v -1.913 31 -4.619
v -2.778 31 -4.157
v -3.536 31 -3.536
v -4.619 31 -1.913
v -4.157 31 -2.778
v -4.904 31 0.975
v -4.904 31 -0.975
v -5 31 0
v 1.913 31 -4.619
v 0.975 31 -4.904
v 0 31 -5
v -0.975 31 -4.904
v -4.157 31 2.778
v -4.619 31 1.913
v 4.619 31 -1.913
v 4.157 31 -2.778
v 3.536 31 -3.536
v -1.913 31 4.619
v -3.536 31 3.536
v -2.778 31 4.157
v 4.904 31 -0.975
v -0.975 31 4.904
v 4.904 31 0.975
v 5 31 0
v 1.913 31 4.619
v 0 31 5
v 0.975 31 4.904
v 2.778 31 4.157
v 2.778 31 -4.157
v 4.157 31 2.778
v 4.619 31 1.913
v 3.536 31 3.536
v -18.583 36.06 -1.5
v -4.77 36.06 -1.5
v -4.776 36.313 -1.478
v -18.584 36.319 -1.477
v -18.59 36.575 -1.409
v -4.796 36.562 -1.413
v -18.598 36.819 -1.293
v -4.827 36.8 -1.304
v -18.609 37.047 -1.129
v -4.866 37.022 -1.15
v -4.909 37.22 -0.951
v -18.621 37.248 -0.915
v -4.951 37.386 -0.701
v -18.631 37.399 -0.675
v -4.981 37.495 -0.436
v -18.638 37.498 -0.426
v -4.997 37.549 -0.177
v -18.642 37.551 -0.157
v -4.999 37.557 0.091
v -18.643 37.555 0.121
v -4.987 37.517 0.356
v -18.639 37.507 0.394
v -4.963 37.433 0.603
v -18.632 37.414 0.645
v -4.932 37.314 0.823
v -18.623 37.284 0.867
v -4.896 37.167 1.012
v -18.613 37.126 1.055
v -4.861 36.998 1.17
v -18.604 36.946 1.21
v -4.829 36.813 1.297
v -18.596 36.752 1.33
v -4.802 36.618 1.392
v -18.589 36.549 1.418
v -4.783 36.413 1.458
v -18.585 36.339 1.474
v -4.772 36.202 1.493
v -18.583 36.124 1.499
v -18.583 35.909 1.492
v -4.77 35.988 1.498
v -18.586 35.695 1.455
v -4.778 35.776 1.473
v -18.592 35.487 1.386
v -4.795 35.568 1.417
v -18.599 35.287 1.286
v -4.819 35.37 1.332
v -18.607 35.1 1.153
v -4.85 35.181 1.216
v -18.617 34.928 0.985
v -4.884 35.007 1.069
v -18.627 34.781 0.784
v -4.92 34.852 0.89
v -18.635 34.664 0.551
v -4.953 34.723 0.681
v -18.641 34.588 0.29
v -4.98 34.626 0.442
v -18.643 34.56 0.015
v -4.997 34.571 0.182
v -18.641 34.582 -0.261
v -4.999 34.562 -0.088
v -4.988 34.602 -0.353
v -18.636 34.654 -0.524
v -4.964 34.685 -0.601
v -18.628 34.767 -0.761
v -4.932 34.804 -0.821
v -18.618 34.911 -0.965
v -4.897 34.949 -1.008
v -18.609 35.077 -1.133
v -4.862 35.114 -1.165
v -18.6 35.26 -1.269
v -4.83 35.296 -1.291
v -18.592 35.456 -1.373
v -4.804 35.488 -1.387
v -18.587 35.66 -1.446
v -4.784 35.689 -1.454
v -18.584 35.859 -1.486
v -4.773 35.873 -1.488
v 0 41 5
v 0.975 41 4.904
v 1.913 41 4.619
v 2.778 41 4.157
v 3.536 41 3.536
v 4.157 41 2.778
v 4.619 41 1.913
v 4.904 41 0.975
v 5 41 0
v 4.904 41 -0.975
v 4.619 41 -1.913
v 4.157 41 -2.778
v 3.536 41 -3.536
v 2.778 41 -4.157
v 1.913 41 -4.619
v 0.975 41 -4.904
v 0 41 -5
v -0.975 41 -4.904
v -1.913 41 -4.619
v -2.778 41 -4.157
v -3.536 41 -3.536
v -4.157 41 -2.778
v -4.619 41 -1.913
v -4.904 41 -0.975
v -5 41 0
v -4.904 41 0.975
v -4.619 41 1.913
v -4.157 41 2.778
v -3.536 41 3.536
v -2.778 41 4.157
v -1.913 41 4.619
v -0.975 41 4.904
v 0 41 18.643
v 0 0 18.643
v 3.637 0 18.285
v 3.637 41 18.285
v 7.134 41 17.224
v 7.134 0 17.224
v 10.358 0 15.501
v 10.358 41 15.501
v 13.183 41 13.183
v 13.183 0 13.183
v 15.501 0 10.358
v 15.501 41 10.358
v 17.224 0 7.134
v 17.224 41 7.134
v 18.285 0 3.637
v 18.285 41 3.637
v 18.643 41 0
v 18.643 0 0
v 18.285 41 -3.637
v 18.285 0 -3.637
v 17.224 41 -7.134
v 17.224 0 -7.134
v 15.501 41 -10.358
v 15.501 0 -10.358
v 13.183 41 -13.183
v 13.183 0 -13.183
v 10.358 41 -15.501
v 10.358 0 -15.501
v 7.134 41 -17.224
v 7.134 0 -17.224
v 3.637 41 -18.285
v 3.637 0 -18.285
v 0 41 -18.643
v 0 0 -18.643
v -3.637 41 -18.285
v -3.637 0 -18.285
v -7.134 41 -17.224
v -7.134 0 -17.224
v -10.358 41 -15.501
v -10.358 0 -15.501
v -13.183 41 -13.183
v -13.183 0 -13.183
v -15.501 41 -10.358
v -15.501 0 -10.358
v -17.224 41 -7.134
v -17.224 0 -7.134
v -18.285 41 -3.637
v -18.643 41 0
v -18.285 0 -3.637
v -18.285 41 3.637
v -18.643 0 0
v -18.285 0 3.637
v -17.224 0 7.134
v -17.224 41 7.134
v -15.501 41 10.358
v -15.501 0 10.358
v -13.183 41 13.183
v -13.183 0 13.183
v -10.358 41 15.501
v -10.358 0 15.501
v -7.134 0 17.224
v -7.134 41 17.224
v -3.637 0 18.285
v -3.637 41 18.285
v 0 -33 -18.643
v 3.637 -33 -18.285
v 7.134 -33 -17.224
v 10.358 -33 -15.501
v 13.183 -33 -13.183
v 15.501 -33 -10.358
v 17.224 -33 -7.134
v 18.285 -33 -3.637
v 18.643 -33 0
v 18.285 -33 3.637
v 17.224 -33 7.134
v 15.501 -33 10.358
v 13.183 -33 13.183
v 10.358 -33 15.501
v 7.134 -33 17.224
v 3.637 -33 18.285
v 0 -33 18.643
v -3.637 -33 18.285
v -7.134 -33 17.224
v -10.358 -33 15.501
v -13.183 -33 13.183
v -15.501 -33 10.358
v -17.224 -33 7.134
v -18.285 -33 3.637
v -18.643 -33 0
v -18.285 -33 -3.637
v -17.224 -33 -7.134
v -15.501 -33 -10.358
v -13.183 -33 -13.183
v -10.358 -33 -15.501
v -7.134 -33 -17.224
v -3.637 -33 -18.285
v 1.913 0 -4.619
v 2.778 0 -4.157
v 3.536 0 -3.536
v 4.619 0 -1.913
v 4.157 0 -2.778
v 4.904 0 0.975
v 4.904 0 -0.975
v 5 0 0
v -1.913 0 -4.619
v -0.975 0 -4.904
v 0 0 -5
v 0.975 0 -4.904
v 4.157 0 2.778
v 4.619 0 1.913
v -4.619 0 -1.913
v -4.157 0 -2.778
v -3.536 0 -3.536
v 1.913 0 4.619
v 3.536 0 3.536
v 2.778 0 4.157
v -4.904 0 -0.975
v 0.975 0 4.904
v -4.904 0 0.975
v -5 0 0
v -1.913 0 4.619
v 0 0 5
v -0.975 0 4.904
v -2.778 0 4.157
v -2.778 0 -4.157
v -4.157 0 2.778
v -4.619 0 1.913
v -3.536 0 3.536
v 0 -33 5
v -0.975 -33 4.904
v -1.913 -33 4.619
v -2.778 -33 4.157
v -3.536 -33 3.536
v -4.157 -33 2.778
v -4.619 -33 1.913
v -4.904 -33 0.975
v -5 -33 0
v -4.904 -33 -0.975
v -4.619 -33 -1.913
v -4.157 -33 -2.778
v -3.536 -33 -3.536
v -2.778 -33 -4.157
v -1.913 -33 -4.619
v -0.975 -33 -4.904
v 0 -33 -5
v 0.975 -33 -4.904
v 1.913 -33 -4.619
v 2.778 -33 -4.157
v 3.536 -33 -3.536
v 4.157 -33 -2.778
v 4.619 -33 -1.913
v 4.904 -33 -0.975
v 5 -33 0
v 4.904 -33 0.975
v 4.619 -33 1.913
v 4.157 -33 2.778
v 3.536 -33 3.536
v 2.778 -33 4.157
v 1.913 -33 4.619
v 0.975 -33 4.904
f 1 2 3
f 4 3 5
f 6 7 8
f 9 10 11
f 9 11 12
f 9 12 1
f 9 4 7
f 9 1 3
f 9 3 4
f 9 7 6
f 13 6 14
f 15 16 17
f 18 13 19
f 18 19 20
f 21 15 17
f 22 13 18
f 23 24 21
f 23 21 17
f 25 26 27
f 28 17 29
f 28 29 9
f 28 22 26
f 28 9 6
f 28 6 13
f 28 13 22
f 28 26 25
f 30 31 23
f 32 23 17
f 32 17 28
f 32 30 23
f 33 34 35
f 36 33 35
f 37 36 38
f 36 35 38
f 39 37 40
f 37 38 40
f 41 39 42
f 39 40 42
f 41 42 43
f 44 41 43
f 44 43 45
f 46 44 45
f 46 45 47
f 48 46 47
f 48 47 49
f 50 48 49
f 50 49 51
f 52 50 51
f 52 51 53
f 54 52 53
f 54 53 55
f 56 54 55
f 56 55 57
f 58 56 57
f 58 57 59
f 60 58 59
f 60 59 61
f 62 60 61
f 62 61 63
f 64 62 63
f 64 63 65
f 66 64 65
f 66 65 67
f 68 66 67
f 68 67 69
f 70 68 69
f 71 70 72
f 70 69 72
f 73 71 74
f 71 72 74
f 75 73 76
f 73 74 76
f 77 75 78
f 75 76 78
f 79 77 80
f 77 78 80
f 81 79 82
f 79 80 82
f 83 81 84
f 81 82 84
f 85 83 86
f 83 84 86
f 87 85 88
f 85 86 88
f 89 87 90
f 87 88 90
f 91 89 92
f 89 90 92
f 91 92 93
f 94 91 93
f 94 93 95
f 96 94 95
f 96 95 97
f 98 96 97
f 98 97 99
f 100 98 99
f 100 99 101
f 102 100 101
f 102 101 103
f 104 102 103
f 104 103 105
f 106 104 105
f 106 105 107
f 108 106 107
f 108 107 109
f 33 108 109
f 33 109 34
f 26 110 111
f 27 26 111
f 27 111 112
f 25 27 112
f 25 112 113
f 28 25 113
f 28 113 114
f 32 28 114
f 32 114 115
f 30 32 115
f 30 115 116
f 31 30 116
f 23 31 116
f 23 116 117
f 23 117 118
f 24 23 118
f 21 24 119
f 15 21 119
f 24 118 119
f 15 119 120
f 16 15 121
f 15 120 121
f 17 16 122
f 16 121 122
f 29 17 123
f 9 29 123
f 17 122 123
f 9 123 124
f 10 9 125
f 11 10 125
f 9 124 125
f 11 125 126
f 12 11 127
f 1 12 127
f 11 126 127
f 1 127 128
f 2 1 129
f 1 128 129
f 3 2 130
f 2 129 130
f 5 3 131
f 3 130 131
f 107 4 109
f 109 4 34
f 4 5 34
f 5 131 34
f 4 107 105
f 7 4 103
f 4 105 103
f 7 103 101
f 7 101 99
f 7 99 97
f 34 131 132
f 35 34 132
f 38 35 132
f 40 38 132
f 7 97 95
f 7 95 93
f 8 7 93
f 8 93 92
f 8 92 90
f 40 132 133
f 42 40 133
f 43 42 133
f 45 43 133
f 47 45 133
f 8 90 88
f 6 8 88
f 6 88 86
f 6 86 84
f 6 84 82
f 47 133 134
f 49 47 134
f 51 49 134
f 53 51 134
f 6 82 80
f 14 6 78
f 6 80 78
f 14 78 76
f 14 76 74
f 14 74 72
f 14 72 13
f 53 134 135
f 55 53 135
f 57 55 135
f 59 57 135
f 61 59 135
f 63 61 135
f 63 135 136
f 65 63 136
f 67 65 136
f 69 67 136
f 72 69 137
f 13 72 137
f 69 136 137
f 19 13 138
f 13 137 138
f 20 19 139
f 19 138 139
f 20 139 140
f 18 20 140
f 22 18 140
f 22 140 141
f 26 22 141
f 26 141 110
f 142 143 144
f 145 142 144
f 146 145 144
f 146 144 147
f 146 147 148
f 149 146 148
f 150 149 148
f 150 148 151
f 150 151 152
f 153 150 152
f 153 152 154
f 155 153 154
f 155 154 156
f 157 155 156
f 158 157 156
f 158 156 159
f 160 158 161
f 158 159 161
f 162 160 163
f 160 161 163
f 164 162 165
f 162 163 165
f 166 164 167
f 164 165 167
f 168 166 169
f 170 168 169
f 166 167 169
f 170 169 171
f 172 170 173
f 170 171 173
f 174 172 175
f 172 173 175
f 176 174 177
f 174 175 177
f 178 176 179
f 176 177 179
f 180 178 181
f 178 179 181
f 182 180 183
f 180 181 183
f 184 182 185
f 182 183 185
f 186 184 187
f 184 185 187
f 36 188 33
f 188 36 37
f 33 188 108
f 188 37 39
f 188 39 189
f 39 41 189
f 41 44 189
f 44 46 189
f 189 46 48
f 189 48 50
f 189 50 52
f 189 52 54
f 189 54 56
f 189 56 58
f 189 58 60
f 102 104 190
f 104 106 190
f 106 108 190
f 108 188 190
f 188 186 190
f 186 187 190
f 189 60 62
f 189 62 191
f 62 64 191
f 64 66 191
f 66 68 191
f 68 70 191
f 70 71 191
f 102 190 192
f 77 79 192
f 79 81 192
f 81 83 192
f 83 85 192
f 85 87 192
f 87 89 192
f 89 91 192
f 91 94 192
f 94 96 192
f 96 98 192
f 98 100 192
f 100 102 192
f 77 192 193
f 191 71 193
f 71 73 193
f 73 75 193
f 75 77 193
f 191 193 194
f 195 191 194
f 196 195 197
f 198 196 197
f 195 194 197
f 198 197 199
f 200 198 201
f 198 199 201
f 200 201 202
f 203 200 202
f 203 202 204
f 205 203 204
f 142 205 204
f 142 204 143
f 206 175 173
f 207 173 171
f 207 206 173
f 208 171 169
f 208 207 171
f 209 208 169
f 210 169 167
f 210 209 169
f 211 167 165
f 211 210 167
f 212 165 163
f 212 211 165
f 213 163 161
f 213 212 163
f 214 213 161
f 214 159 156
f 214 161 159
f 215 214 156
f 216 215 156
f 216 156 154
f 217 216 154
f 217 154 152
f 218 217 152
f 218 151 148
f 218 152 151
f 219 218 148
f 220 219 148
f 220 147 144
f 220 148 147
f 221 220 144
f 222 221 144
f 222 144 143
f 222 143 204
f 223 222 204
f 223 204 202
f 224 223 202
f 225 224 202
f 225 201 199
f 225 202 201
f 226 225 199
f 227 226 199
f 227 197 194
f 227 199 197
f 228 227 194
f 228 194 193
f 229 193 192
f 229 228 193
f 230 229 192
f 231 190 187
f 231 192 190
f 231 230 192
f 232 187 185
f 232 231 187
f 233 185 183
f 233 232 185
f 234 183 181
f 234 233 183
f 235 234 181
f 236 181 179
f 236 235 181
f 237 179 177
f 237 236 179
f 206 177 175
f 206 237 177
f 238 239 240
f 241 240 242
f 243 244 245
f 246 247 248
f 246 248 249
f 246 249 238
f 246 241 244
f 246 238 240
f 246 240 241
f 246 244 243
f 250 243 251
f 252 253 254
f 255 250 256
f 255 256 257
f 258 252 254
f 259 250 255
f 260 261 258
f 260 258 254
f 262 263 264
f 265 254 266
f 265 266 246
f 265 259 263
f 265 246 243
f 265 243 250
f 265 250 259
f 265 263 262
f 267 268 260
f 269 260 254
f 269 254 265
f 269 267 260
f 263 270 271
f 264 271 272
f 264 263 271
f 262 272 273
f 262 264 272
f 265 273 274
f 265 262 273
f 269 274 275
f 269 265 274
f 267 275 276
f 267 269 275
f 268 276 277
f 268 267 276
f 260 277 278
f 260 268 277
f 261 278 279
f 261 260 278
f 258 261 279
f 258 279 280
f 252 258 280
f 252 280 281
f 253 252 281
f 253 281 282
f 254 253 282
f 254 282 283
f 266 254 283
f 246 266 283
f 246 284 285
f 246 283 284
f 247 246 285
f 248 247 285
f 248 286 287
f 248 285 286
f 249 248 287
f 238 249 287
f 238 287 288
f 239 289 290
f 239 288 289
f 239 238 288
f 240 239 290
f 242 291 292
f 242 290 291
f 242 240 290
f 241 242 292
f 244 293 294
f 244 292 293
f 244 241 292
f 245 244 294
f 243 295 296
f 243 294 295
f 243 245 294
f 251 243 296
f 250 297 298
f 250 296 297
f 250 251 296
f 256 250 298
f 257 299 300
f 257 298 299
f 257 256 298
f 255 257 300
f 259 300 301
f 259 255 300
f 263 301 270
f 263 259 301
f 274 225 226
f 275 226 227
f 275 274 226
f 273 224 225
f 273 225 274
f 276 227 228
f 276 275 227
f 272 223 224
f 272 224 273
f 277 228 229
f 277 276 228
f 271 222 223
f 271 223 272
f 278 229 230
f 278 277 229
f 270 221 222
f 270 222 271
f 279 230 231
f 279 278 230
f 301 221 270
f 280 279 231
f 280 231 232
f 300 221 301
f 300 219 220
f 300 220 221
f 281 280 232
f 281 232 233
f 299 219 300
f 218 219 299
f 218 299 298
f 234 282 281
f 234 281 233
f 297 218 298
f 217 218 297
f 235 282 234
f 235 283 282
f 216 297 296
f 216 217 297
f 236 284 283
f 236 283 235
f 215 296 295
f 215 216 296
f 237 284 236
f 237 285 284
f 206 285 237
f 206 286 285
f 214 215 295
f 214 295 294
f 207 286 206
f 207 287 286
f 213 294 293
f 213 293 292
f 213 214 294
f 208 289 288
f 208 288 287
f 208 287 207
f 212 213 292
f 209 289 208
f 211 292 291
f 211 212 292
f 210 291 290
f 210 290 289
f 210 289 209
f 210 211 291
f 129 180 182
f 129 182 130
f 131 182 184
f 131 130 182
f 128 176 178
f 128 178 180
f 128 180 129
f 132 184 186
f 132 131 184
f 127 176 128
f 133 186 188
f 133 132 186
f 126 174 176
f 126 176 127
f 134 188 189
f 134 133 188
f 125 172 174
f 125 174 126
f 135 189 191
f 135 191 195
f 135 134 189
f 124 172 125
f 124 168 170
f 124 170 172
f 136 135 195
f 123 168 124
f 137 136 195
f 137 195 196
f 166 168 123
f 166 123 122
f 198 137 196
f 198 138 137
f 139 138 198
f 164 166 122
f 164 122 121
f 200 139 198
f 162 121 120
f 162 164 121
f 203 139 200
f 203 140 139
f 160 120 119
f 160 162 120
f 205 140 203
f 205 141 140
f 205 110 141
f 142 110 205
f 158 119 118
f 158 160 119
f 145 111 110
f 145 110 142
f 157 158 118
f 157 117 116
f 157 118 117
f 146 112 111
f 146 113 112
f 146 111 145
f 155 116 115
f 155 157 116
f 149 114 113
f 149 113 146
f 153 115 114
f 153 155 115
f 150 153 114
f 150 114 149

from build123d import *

# Parameters (mm, degrees)
SKETCH1_R                   = 18.643111828
F_40MM_ARM_DEPTH            = 41
SKETCH2_R                   = 5
F_10MM_HOLE_10MM_DEEP_DEPTH = 10
SKETCH3_R                   = 1.5
F_0_01M_SCREW_HOLE_DEPTH    = 25
BOSS_EXTRUDE1_START         = 33
SKETCH5_R                   = 18.643111828
BOSS_EXTRUDE1_DEPTH         = 33
SKETCH4_R                   = 5
CUT_EXTRUDE2_DEPTH          = 92


with BuildPart() as part:
    # Sketch1 → 40mm arm (new body)
    with BuildSketch(Plane(origin=(0, 0, 0), x_dir=(1, 0, 0), z_dir=(0, 1, 0))):
        with Locations(Location((0, 0, 0), (0, 0, 270))):
            Circle(SKETCH1_R)
    extrude(amount=F_40MM_ARM_DEPTH)

    # Sketch2 → 10mm hole, 10mm deep (cut)
    with BuildSketch(Plane(origin=(0, 41, 0), x_dir=(1, 0, 0), z_dir=(0, 1, 0))):
        with Locations(Location((0, 0, 0), (0, 0, 270))):
            Circle(SKETCH2_R)
    extrude(amount=-F_10MM_HOLE_10MM_DEEP_DEPTH, mode=Mode.SUBTRACT)

    # Sketch3 → 0.01m screw hole (cut)
    with BuildSketch(Plane(origin=(0, 0, 0), x_dir=(0, 0, -1), z_dir=(1, 0, 0))):
        with Locations((0, 36.059550575)):
            Circle(SKETCH3_R)
    extrude(amount=-F_0_01M_SCREW_HOLE_DEPTH, mode=Mode.SUBTRACT)

    # Sketch5 → Boss-Extrude1 (add)
    with BuildSketch(Plane.XZ.offset(BOSS_EXTRUDE1_START)):
        with Locations(Location((0, 0, 0), (0, 0, 270))):
            Circle(SKETCH5_R)
    extrude(amount=-BOSS_EXTRUDE1_DEPTH)

    # Sketch4 → Cut-Extrude2 (cut)
    with BuildSketch(Plane.XZ):
        with Locations(Location((0, 0, 0), (0, 0, 90))):
            Circle(SKETCH4_R)
    extrude(amount=CUT_EXTRUDE2_DEPTH, mode=Mode.SUBTRACT)


solid = part.part
